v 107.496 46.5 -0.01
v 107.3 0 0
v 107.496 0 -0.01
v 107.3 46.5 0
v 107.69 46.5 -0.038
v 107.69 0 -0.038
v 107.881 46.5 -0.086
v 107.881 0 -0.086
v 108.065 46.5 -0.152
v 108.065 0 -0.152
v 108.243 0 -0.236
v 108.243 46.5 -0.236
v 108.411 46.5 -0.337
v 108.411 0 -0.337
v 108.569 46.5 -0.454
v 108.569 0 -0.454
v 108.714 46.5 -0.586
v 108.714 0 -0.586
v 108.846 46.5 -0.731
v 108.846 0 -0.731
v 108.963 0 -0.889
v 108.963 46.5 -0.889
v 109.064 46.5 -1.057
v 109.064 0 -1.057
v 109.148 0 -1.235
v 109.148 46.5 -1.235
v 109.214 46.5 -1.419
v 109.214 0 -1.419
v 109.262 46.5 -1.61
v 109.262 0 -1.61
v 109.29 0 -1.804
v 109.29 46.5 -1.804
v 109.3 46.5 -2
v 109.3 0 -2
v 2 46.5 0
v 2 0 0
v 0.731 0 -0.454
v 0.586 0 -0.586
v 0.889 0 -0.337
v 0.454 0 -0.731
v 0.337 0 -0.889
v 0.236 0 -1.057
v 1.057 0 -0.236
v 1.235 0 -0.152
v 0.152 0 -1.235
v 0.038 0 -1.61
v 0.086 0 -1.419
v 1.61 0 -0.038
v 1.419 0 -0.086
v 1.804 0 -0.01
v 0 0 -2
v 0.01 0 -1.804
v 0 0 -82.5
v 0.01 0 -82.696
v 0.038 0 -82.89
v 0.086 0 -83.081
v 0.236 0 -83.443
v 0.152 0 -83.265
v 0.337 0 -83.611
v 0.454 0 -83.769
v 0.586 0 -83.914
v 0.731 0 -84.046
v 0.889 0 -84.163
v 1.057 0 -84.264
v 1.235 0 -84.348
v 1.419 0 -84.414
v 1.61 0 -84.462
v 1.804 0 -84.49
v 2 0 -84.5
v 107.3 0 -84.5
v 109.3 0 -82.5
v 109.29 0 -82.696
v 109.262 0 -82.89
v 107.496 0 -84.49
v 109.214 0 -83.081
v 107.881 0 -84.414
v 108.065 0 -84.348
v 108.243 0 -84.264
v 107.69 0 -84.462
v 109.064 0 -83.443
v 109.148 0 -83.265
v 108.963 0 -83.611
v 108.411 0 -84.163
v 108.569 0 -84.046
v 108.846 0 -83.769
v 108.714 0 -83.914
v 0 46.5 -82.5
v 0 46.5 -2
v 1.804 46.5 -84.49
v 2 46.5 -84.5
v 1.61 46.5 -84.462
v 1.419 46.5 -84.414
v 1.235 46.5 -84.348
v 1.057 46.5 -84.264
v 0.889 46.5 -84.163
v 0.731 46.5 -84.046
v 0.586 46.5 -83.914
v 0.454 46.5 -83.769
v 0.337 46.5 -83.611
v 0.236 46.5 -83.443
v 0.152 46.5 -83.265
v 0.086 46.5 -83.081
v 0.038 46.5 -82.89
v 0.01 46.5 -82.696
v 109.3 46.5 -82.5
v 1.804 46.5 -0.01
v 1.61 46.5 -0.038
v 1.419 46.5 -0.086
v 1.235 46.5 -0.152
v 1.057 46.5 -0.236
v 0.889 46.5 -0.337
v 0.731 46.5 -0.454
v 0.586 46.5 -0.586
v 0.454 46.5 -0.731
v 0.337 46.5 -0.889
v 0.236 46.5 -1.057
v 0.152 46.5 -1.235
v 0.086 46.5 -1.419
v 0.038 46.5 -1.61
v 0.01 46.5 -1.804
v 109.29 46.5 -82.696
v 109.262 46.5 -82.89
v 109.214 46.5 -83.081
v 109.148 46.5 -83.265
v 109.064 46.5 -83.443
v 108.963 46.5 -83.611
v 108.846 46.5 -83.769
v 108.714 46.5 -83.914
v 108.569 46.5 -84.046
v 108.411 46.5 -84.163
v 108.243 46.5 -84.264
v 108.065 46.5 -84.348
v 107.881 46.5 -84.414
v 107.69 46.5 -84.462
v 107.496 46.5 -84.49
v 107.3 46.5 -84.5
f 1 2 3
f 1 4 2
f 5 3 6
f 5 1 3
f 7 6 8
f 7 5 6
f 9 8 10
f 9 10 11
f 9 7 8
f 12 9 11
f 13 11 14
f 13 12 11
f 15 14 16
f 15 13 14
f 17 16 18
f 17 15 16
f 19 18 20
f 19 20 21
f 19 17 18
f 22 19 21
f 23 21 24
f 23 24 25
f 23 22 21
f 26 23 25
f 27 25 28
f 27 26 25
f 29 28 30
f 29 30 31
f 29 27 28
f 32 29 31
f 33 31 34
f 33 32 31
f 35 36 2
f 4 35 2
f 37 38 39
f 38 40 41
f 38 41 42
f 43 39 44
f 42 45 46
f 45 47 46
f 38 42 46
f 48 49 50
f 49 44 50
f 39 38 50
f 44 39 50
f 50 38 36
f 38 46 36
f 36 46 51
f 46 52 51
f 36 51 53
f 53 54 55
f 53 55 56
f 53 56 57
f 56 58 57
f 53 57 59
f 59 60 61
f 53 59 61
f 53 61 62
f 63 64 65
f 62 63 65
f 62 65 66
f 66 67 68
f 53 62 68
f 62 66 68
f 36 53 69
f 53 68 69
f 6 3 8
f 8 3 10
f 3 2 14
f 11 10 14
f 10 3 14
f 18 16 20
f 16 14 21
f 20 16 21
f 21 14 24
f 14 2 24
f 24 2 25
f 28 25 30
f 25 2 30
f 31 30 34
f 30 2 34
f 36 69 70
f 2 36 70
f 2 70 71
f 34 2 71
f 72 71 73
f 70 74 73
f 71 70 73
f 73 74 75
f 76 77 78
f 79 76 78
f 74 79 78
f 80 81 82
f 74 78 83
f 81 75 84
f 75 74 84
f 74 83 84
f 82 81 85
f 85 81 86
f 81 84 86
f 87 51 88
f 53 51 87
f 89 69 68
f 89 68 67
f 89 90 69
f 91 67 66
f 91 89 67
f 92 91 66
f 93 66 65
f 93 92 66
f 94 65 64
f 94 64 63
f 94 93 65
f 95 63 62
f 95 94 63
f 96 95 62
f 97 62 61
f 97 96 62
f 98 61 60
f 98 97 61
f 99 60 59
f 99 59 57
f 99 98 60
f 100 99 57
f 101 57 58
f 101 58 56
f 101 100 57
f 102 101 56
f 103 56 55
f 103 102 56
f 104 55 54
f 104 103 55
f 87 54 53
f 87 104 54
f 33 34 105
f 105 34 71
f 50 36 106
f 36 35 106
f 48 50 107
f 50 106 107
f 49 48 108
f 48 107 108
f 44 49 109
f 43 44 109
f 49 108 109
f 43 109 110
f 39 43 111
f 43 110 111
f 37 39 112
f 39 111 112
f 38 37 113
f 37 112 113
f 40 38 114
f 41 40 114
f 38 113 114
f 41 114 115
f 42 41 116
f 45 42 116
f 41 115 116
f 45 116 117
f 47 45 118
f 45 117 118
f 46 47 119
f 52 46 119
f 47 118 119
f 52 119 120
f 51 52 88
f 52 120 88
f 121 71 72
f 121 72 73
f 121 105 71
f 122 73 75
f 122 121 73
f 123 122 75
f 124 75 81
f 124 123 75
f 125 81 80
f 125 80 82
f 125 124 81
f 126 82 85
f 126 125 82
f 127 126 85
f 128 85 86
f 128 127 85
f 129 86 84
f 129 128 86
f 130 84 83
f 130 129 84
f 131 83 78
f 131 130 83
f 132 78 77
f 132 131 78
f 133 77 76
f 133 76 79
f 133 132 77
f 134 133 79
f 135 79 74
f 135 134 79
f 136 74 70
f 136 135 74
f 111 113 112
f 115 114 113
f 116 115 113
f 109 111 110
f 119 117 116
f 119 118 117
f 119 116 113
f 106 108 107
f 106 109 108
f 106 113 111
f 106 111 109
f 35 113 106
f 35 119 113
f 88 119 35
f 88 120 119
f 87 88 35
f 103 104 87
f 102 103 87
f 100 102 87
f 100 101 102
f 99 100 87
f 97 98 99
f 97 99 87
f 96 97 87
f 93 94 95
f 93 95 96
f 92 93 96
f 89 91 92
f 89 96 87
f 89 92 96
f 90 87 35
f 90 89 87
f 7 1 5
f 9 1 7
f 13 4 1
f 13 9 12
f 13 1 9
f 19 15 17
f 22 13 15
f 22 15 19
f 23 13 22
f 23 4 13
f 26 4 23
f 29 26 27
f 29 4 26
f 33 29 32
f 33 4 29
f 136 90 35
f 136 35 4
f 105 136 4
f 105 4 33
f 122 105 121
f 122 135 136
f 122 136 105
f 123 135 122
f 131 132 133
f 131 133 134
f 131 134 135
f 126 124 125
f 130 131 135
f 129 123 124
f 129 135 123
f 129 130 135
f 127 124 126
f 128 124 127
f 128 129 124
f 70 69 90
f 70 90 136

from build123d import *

# Parameters (mm, degrees)
SKETCH1_W           = 109.3
SKETCH1_H           = 84.5
BOSS_EXTRUDE3_DEPTH = 46.5
FILLET2_R           = 2
FILLET3_R           = 2
FILLET4_R           = 2
FILLET5_R           = 2


with BuildPart() as part:
    # Sketch1 → Boss-Extrude3 (new body)
    with BuildSketch(Plane(origin=(0, 0, 0), x_dir=(1, 0, 0), z_dir=(0, 1, 0))):
        with Locations((54.65, 42.25)):
            Rectangle(SKETCH1_W, SKETCH1_H)
    extrude(amount=BOSS_EXTRUDE3_DEPTH)

    # Fillet2
    fillet2_edges = [part.edges().sort_by_distance(p)[0] for p in [
        (109.3, 23.25, 0),
    ]]
    fillet(fillet2_edges, radius=FILLET2_R)

    # Fillet3
    fillet3_edges = [part.edges().sort_by_distance(p)[0] for p in [
        (0, 23.25, 0),
    ]]
    fillet(fillet3_edges, radius=FILLET3_R)

    # Fillet4
    fillet4_edges = [part.edges().sort_by_distance(p)[0] for p in [
        (109.3, 23.25, -84.5),
    ]]
    fillet(fillet4_edges, radius=FILLET4_R)

    # Fillet5
    fillet5_edges = [part.edges().sort_by_distance(p)[0] for p in [
        (0, 23.25, -84.5),
    ]]
    fillet(fillet5_edges, radius=FILLET5_R)


solid = part.part
